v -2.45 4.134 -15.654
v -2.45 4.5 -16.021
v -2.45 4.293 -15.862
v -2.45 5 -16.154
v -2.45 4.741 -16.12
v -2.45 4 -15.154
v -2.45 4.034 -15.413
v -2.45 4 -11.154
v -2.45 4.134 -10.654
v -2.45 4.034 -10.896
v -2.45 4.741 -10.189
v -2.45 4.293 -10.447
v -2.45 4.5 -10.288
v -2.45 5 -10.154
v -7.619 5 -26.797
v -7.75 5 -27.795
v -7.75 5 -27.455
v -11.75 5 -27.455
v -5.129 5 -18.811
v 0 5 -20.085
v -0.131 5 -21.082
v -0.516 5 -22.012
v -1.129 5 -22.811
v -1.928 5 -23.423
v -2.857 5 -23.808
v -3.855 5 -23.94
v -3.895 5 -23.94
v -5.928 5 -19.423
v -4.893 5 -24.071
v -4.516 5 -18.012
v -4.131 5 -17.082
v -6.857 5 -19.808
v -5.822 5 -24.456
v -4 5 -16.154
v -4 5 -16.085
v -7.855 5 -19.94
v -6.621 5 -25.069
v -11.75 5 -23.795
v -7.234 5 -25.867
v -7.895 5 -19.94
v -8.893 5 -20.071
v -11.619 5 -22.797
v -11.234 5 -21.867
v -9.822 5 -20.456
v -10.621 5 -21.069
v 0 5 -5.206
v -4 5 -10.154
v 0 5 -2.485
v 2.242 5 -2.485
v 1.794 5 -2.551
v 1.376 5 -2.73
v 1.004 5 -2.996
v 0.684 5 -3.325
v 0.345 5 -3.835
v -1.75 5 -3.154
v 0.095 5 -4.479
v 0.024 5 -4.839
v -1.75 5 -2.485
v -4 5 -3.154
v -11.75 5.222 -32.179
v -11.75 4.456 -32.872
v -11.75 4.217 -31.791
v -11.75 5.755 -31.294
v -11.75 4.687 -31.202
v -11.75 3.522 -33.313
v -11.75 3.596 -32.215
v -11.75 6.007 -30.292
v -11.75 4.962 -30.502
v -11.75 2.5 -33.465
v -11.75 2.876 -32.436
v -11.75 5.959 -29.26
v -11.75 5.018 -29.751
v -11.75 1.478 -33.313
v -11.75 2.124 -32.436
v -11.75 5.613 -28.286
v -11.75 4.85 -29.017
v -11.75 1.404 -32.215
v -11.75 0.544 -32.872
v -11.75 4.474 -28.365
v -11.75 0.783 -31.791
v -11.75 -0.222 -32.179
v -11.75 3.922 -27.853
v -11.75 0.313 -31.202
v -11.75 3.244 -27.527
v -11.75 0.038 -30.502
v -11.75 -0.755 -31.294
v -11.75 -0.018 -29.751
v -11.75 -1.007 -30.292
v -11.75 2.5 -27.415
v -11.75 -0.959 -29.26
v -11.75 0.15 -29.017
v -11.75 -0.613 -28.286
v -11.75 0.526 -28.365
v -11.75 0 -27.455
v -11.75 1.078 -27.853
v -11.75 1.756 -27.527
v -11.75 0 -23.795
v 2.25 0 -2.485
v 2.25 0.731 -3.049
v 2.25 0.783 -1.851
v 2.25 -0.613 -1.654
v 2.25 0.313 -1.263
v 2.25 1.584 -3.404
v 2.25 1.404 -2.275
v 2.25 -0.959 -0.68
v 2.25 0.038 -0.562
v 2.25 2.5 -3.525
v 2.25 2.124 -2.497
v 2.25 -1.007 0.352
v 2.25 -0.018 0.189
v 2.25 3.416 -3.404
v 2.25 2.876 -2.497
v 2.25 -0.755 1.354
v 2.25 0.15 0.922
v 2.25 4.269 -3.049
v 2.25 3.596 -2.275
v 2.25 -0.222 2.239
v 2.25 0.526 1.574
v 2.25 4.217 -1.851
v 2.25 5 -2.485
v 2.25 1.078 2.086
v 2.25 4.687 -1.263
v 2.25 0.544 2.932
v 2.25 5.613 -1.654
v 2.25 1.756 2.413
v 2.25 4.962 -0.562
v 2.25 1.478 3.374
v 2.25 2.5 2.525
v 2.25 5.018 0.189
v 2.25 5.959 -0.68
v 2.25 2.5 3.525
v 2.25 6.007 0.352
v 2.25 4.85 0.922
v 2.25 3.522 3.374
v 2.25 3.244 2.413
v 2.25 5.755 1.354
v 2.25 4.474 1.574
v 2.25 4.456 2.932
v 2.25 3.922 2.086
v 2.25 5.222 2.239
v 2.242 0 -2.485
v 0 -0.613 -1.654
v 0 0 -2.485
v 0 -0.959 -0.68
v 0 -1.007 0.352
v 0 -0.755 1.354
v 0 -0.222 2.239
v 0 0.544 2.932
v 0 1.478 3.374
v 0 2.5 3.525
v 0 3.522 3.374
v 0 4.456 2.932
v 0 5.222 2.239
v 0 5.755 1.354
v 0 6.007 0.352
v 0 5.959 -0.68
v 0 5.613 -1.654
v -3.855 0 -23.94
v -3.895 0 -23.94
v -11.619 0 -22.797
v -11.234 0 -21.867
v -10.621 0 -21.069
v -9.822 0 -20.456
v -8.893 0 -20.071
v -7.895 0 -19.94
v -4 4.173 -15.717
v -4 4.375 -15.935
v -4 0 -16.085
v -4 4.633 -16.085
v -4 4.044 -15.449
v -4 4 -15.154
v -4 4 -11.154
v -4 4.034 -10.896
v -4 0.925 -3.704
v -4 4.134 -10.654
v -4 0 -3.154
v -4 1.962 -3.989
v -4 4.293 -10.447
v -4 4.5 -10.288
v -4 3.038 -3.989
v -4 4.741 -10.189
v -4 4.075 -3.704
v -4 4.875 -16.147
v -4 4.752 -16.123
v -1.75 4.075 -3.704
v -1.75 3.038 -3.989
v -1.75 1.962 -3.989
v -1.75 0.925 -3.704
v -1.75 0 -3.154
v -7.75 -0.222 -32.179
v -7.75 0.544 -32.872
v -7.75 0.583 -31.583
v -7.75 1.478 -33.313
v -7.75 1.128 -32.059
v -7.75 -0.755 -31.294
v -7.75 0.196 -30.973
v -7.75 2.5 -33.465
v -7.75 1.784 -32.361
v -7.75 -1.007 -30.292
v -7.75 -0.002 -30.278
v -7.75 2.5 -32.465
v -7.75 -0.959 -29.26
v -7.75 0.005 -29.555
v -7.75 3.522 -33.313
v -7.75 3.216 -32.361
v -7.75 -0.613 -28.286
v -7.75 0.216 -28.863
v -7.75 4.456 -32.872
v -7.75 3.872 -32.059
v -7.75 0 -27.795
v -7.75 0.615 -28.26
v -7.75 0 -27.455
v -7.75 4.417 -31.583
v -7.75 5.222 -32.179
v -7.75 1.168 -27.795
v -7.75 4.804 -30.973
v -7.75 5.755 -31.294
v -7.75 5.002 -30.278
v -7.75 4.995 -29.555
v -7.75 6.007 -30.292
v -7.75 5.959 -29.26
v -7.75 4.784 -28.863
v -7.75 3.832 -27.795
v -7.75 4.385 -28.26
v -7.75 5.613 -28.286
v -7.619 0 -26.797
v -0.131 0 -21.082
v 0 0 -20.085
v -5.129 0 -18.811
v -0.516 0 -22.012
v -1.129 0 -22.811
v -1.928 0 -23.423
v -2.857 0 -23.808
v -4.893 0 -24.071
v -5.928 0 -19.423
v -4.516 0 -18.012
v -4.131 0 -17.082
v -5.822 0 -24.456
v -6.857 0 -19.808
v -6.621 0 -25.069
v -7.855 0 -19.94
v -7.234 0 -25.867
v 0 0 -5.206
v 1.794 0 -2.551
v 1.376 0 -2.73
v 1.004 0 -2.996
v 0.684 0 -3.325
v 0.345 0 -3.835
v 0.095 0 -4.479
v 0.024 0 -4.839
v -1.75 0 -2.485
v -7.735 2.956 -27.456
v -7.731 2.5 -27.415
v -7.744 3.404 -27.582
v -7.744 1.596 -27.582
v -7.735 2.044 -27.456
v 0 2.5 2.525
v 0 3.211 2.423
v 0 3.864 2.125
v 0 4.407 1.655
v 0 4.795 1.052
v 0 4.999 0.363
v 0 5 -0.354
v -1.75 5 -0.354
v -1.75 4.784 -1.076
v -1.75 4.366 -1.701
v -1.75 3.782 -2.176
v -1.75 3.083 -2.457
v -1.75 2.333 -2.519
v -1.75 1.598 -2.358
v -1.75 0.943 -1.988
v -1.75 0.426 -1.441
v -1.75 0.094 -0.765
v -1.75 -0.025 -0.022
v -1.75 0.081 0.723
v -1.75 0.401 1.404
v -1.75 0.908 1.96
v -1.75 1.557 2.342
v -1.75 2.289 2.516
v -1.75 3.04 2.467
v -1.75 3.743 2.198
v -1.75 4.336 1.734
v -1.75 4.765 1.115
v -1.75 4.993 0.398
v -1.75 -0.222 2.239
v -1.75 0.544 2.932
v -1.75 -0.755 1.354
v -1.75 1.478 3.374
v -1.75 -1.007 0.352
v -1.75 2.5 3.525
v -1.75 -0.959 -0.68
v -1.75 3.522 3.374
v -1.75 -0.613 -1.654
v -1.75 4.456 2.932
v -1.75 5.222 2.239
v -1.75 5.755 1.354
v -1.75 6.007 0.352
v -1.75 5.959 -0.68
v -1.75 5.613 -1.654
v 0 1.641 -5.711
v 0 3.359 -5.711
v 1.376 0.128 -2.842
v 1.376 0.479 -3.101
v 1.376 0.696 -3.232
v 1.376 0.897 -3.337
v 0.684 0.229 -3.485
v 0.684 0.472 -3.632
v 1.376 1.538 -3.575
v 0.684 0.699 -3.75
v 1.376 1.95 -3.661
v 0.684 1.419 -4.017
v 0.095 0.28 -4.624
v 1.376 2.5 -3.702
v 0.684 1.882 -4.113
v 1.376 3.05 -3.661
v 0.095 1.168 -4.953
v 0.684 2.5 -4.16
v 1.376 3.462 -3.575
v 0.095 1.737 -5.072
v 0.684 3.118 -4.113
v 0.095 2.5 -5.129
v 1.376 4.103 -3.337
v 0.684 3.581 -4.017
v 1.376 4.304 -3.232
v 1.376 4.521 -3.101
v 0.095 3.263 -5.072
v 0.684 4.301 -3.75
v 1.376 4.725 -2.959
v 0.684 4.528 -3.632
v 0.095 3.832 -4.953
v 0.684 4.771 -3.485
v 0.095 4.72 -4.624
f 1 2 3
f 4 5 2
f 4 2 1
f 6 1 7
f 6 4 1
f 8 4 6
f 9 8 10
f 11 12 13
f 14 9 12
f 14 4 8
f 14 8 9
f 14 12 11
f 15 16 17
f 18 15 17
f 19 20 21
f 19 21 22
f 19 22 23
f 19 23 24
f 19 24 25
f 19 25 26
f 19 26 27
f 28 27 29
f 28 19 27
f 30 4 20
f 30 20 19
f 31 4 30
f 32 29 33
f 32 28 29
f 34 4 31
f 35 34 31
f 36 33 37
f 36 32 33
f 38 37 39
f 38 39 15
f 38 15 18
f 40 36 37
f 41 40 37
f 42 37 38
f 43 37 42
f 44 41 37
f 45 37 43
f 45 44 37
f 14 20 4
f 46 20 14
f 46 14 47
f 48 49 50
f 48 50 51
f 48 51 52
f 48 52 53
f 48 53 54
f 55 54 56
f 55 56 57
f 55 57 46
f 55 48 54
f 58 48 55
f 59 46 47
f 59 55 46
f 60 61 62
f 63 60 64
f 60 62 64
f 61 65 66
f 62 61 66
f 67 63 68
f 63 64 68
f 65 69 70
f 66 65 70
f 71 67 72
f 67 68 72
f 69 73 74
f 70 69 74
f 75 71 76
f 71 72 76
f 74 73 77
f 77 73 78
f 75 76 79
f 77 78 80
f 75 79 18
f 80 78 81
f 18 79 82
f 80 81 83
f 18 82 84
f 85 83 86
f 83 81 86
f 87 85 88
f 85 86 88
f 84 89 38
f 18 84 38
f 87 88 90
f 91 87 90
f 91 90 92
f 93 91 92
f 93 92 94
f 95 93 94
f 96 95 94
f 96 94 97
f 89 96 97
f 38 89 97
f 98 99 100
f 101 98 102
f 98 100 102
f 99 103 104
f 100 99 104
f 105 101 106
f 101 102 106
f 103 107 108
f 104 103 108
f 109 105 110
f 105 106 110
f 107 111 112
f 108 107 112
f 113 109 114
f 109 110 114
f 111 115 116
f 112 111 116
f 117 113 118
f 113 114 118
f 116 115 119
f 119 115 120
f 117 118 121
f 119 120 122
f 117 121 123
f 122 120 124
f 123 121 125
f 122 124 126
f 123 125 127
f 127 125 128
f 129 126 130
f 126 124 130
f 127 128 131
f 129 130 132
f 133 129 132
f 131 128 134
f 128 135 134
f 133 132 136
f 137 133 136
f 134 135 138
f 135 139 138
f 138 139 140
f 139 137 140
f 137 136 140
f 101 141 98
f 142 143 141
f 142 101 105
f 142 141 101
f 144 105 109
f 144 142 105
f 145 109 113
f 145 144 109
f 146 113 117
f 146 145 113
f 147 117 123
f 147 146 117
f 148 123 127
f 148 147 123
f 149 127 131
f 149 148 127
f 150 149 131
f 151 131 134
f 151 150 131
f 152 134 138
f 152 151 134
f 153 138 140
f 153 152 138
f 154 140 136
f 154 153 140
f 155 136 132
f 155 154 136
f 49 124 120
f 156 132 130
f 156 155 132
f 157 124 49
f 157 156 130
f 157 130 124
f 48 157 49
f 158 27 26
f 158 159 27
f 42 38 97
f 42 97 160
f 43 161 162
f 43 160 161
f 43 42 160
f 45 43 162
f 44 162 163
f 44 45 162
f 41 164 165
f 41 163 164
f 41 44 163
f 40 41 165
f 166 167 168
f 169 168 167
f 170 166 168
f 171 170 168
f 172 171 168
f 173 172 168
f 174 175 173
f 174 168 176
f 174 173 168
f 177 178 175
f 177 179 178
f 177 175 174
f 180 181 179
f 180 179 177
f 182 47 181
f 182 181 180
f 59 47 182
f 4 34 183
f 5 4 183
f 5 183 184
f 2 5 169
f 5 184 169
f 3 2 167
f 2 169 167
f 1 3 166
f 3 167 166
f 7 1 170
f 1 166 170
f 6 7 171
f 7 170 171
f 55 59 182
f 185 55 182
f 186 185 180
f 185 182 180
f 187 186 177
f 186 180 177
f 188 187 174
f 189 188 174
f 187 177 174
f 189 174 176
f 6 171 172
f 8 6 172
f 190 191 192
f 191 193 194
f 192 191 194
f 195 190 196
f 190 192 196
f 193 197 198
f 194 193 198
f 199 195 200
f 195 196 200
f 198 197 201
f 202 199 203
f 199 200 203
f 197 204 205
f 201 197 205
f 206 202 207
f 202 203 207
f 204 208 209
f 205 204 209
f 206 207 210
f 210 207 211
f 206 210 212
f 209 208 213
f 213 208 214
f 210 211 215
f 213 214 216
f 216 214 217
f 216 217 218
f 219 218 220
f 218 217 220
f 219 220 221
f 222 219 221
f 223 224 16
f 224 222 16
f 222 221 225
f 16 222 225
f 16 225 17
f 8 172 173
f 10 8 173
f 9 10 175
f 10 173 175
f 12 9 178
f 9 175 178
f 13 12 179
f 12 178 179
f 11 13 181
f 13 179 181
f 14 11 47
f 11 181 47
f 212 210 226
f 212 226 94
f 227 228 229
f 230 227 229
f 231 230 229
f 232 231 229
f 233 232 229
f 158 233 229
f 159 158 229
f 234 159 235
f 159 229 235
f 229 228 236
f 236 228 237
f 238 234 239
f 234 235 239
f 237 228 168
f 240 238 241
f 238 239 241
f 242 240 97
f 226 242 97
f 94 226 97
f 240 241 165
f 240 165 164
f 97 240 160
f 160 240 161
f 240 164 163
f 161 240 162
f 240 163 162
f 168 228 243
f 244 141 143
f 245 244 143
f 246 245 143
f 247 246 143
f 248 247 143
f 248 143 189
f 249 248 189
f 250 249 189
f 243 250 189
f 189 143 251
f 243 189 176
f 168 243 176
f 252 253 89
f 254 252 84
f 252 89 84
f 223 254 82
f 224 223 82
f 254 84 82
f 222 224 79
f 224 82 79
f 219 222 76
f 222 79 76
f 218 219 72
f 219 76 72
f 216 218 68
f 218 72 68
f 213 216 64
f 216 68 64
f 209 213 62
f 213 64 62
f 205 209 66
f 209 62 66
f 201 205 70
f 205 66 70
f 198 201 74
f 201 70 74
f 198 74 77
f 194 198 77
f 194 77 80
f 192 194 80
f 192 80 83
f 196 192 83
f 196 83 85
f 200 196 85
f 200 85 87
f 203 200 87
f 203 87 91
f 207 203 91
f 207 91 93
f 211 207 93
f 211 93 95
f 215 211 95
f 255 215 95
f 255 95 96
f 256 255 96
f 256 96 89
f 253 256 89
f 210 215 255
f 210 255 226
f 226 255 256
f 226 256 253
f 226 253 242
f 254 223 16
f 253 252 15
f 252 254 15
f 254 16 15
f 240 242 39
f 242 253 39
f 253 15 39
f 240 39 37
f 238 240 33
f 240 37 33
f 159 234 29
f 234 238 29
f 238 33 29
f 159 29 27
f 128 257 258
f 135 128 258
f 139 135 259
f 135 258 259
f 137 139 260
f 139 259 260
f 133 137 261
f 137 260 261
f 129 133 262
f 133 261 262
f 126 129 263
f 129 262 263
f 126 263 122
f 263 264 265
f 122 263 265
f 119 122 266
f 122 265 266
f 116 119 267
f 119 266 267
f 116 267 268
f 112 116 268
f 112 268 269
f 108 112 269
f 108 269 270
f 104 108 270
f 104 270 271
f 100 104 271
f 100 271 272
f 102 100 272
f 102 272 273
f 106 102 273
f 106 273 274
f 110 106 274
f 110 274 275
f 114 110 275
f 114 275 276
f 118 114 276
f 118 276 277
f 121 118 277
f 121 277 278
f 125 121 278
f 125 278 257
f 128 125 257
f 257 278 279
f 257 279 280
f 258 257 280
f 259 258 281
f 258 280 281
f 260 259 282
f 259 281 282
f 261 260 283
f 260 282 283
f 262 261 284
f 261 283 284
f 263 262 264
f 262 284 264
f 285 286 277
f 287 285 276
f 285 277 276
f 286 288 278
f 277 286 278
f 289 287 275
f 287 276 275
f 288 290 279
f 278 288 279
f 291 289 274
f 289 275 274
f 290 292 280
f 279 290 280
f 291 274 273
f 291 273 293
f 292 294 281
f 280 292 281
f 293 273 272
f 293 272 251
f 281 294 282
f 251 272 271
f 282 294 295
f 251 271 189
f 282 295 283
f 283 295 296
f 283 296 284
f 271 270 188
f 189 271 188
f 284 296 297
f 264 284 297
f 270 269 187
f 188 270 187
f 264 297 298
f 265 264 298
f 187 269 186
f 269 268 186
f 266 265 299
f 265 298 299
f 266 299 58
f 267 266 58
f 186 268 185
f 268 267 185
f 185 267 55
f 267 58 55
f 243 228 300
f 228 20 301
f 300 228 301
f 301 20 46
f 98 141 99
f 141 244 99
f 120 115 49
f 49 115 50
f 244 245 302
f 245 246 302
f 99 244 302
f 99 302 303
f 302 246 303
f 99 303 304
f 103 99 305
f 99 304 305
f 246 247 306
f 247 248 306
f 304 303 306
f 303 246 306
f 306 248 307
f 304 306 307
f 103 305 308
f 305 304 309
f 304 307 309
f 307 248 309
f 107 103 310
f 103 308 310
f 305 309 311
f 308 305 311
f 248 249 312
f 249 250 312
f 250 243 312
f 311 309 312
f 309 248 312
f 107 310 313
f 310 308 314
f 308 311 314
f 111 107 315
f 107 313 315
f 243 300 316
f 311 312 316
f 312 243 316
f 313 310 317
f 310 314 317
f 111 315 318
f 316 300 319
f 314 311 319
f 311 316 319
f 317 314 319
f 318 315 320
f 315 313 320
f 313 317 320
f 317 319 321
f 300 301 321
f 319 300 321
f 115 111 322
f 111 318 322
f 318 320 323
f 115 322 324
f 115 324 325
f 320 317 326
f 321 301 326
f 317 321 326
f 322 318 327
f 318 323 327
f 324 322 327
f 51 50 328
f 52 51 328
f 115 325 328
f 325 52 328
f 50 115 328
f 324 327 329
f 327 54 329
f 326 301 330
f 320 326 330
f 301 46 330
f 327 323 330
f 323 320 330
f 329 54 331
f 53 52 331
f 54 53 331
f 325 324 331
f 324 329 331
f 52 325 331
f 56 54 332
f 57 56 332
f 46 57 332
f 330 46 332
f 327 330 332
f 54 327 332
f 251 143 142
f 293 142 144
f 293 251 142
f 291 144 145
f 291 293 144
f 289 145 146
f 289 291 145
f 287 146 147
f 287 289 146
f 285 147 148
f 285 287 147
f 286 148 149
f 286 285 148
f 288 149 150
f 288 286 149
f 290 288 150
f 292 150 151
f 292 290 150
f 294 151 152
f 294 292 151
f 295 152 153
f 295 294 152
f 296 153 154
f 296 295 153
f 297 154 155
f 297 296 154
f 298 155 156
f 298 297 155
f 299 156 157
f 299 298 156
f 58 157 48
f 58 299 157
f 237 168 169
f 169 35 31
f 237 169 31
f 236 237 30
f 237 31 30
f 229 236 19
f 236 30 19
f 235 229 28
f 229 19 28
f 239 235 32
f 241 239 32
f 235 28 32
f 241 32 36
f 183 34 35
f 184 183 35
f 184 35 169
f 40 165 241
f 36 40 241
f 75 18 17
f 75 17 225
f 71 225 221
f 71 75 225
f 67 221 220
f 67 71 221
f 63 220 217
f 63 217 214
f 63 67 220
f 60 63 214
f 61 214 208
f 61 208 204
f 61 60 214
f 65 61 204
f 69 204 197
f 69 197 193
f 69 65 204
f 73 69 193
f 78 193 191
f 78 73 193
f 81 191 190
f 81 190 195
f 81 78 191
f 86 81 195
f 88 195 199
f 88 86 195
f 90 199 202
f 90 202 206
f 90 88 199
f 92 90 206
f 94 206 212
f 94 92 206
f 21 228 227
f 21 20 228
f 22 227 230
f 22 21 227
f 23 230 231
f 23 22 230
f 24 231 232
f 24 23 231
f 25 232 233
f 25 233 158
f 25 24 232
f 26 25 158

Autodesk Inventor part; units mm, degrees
ref_plane "YZ Plane" through (0, 0, 0) normal (1, 0, 0) x (0, 1, 0)
ref_plane "XZ Plane" through (0, 0, 0) normal (0, 1, 0) x (-1, 0, 0)
ref_plane "XY Plane" through (0, 0, 0) normal (0, 0, 1) x (1, 0, 0)
sketch "Эскиз1" plane through (0, 0, 0) normal (0, 1, 0) x (-1, 0, 0)
  line L0 (0, 0) -> (4, 0)
  line L1 (4, 0) -> (4, -23.9397)
  line L2 (4, -23.9397) -> (0, -23.9397)
  line L3 (0, -23.9397) -> (0, 0)
  line L4 (0, -23.9397) -> (11.75, -23.9397)
  line L5 (11.75, -23.9397) -> (11.75, -19.9397)
  line L6 (11.75, -19.9397) -> (0, -19.9397)
  line L7 (0, -19.9397) -> (0, -23.9397)
  line L8 (11.75, -19.9397) -> (7.75, -19.9397)
  line L9 (7.75, -19.9397) -> (7.75, -29.9397)
  line L10 (7.75, -29.9397) -> (11.75, -29.9397)
  line L11 (11.75, -29.9397) -> (11.75, -19.9397)
  line L12 (11.75, -23.9397) -> (4, -19.9397)
  line L13 (0, -19.9397) -> (7.75, -23.9397)
  point P0 (3, -20.536)
  point P1 (0, -19.9397)
  dimension "d10" = 4
  dimension "d11" = 11.75
  dimension "d36" = 29.9397
  dimension "d55" = 10
extrude "Выдавливание1" add sketch "Эскиз1" along normal blind 5
fillet "Сопряжение2" radius 3.855 4 edges at (-4, 2.5, -19.9397) (-11.75, 2.5, -19.9397) (0, 2.5, -23.9397) (-7.75, 2.5, -23.9397)
sketch "Эскиз7" plane through (-11.75, 0, -29.9397) normal (-1, 0, 0) x (0, 0, 1)
  line L0 (0, 0) -> (0, 5) projected
  circle A0 centre (0, 2.5) radius 2.525
  circle A1 centre (0, 2.5) radius 3.525
  point P0 (29.9397, 0)
  point P1 (0, 4.975)
  point P2 (0, 0.025)
  dimension "d37" = 5.05
  dimension "d38" = 7.05
extrude "Выдавливание5" add sketch "Эскиз7" against normal up to surface (4 mm away) contours A0 | A1
extrude "Выдавливание8" cut sketch "Эскиз7" against normal through all contours A0
sketch "Эскиз8" plane through (-4, 0, 0) normal (-1, 0, 0) x (0, 0, 1)
  line L0 (0, 0) -> (0, 5) projected
  circle A0 centre (0, 2.5) radius 2.525
  circle A1 centre (0, 2.5) radius 3.525
  point P0 (0, 4.975)
  point P1 (0, 0.025)
  dimension "d41" = 5.05
  dimension "d42" = 7.05
extrude "Выдавливание6" add sketch "Эскиз8" against normal up to surface (4 mm away)
extrude "Выдавливание7" cut sketch "Эскиз8" against normal through all contours A0
sketch "Эскиз9" plane through (-4, 0, -20.0847) normal (1, 0, 0) x (0, 0, -1)
  circle A0 centre (-20.0847, 2.5) radius 2.525 projected
  circle A1 centre (-20.0847, 2.5) radius 4.025
  arc A2 (-17.5996, 5) -> (-17.5996, 0) centre (-20.0847, 2.5) ccw projected
  point P0 (-20.0847, 0)
  point P1 (-20.0847, 4.975)
  point P2 (-20.0847, 0.025)
  point P3 (-19.7302, 5)
  point P4 (-19.7302, 0)
  dimension "d49" = 0.5
extrude "Выдавливание9" cut sketch "Эскиз9" along normal blind 2.25 contours A0 | A1
sketch "Эскиз10" plane through (0, 0, -16.0847) normal (-1, 0, 0) x (0, 0, 1)
  arc A0 (13.5996, 0) -> (13.5996, 5) centre (16.0847, 2.5) ccw projected
  circle A1 centre (16.0847, 2.5) radius 3.525
  circle A2 centre (16.0847, 2.5) radius 2.525 projected
  point P0 (12.3578, 0)
  point P1 (12.3578, 5)
  point P2 (13.5996, 5)
  point P3 (13.5996, 0)
  point P4 (13.671, 5)
  point P5 (13.671, 0)
extrude "Выдавливание10" add sketch "Эскиз10" against normal blind 2.25
fillet "Сопряжение6" radius 2.25 1 edges at (0, 2.5, -3.525)
sketch "Эскиз11" plane through (-4, 0, -16.0847) normal (-1, 0, 0) x (0, 0, 1)
  line L0 (4.9302, 5) -> (0.9302, 5) construction
  line L1 (4.9302, 6) -> (0.9302, 6)
  line L2 (0.9302, 4) -> (4.9302, 4)
  arc A0 (4.9302, 4) -> (4.9302, 6) centre (4.9302, 5) ccw
  arc A1 (0.9302, 6) -> (0.9302, 4) centre (0.9302, 5) ccw
  line L3 (0, 5) -> (12.9302, 5) projected
  point P0 (16.0847, 0)
  point P1 (2.9302, 5)
  dimension "d56" = 2
  dimension "d57" = 2
  dimension "d58" = 10
extrude "Выдавливание11" cut sketch "Эскиз11" against normal blind 1.55
properties part number "Рулевая тяга"
